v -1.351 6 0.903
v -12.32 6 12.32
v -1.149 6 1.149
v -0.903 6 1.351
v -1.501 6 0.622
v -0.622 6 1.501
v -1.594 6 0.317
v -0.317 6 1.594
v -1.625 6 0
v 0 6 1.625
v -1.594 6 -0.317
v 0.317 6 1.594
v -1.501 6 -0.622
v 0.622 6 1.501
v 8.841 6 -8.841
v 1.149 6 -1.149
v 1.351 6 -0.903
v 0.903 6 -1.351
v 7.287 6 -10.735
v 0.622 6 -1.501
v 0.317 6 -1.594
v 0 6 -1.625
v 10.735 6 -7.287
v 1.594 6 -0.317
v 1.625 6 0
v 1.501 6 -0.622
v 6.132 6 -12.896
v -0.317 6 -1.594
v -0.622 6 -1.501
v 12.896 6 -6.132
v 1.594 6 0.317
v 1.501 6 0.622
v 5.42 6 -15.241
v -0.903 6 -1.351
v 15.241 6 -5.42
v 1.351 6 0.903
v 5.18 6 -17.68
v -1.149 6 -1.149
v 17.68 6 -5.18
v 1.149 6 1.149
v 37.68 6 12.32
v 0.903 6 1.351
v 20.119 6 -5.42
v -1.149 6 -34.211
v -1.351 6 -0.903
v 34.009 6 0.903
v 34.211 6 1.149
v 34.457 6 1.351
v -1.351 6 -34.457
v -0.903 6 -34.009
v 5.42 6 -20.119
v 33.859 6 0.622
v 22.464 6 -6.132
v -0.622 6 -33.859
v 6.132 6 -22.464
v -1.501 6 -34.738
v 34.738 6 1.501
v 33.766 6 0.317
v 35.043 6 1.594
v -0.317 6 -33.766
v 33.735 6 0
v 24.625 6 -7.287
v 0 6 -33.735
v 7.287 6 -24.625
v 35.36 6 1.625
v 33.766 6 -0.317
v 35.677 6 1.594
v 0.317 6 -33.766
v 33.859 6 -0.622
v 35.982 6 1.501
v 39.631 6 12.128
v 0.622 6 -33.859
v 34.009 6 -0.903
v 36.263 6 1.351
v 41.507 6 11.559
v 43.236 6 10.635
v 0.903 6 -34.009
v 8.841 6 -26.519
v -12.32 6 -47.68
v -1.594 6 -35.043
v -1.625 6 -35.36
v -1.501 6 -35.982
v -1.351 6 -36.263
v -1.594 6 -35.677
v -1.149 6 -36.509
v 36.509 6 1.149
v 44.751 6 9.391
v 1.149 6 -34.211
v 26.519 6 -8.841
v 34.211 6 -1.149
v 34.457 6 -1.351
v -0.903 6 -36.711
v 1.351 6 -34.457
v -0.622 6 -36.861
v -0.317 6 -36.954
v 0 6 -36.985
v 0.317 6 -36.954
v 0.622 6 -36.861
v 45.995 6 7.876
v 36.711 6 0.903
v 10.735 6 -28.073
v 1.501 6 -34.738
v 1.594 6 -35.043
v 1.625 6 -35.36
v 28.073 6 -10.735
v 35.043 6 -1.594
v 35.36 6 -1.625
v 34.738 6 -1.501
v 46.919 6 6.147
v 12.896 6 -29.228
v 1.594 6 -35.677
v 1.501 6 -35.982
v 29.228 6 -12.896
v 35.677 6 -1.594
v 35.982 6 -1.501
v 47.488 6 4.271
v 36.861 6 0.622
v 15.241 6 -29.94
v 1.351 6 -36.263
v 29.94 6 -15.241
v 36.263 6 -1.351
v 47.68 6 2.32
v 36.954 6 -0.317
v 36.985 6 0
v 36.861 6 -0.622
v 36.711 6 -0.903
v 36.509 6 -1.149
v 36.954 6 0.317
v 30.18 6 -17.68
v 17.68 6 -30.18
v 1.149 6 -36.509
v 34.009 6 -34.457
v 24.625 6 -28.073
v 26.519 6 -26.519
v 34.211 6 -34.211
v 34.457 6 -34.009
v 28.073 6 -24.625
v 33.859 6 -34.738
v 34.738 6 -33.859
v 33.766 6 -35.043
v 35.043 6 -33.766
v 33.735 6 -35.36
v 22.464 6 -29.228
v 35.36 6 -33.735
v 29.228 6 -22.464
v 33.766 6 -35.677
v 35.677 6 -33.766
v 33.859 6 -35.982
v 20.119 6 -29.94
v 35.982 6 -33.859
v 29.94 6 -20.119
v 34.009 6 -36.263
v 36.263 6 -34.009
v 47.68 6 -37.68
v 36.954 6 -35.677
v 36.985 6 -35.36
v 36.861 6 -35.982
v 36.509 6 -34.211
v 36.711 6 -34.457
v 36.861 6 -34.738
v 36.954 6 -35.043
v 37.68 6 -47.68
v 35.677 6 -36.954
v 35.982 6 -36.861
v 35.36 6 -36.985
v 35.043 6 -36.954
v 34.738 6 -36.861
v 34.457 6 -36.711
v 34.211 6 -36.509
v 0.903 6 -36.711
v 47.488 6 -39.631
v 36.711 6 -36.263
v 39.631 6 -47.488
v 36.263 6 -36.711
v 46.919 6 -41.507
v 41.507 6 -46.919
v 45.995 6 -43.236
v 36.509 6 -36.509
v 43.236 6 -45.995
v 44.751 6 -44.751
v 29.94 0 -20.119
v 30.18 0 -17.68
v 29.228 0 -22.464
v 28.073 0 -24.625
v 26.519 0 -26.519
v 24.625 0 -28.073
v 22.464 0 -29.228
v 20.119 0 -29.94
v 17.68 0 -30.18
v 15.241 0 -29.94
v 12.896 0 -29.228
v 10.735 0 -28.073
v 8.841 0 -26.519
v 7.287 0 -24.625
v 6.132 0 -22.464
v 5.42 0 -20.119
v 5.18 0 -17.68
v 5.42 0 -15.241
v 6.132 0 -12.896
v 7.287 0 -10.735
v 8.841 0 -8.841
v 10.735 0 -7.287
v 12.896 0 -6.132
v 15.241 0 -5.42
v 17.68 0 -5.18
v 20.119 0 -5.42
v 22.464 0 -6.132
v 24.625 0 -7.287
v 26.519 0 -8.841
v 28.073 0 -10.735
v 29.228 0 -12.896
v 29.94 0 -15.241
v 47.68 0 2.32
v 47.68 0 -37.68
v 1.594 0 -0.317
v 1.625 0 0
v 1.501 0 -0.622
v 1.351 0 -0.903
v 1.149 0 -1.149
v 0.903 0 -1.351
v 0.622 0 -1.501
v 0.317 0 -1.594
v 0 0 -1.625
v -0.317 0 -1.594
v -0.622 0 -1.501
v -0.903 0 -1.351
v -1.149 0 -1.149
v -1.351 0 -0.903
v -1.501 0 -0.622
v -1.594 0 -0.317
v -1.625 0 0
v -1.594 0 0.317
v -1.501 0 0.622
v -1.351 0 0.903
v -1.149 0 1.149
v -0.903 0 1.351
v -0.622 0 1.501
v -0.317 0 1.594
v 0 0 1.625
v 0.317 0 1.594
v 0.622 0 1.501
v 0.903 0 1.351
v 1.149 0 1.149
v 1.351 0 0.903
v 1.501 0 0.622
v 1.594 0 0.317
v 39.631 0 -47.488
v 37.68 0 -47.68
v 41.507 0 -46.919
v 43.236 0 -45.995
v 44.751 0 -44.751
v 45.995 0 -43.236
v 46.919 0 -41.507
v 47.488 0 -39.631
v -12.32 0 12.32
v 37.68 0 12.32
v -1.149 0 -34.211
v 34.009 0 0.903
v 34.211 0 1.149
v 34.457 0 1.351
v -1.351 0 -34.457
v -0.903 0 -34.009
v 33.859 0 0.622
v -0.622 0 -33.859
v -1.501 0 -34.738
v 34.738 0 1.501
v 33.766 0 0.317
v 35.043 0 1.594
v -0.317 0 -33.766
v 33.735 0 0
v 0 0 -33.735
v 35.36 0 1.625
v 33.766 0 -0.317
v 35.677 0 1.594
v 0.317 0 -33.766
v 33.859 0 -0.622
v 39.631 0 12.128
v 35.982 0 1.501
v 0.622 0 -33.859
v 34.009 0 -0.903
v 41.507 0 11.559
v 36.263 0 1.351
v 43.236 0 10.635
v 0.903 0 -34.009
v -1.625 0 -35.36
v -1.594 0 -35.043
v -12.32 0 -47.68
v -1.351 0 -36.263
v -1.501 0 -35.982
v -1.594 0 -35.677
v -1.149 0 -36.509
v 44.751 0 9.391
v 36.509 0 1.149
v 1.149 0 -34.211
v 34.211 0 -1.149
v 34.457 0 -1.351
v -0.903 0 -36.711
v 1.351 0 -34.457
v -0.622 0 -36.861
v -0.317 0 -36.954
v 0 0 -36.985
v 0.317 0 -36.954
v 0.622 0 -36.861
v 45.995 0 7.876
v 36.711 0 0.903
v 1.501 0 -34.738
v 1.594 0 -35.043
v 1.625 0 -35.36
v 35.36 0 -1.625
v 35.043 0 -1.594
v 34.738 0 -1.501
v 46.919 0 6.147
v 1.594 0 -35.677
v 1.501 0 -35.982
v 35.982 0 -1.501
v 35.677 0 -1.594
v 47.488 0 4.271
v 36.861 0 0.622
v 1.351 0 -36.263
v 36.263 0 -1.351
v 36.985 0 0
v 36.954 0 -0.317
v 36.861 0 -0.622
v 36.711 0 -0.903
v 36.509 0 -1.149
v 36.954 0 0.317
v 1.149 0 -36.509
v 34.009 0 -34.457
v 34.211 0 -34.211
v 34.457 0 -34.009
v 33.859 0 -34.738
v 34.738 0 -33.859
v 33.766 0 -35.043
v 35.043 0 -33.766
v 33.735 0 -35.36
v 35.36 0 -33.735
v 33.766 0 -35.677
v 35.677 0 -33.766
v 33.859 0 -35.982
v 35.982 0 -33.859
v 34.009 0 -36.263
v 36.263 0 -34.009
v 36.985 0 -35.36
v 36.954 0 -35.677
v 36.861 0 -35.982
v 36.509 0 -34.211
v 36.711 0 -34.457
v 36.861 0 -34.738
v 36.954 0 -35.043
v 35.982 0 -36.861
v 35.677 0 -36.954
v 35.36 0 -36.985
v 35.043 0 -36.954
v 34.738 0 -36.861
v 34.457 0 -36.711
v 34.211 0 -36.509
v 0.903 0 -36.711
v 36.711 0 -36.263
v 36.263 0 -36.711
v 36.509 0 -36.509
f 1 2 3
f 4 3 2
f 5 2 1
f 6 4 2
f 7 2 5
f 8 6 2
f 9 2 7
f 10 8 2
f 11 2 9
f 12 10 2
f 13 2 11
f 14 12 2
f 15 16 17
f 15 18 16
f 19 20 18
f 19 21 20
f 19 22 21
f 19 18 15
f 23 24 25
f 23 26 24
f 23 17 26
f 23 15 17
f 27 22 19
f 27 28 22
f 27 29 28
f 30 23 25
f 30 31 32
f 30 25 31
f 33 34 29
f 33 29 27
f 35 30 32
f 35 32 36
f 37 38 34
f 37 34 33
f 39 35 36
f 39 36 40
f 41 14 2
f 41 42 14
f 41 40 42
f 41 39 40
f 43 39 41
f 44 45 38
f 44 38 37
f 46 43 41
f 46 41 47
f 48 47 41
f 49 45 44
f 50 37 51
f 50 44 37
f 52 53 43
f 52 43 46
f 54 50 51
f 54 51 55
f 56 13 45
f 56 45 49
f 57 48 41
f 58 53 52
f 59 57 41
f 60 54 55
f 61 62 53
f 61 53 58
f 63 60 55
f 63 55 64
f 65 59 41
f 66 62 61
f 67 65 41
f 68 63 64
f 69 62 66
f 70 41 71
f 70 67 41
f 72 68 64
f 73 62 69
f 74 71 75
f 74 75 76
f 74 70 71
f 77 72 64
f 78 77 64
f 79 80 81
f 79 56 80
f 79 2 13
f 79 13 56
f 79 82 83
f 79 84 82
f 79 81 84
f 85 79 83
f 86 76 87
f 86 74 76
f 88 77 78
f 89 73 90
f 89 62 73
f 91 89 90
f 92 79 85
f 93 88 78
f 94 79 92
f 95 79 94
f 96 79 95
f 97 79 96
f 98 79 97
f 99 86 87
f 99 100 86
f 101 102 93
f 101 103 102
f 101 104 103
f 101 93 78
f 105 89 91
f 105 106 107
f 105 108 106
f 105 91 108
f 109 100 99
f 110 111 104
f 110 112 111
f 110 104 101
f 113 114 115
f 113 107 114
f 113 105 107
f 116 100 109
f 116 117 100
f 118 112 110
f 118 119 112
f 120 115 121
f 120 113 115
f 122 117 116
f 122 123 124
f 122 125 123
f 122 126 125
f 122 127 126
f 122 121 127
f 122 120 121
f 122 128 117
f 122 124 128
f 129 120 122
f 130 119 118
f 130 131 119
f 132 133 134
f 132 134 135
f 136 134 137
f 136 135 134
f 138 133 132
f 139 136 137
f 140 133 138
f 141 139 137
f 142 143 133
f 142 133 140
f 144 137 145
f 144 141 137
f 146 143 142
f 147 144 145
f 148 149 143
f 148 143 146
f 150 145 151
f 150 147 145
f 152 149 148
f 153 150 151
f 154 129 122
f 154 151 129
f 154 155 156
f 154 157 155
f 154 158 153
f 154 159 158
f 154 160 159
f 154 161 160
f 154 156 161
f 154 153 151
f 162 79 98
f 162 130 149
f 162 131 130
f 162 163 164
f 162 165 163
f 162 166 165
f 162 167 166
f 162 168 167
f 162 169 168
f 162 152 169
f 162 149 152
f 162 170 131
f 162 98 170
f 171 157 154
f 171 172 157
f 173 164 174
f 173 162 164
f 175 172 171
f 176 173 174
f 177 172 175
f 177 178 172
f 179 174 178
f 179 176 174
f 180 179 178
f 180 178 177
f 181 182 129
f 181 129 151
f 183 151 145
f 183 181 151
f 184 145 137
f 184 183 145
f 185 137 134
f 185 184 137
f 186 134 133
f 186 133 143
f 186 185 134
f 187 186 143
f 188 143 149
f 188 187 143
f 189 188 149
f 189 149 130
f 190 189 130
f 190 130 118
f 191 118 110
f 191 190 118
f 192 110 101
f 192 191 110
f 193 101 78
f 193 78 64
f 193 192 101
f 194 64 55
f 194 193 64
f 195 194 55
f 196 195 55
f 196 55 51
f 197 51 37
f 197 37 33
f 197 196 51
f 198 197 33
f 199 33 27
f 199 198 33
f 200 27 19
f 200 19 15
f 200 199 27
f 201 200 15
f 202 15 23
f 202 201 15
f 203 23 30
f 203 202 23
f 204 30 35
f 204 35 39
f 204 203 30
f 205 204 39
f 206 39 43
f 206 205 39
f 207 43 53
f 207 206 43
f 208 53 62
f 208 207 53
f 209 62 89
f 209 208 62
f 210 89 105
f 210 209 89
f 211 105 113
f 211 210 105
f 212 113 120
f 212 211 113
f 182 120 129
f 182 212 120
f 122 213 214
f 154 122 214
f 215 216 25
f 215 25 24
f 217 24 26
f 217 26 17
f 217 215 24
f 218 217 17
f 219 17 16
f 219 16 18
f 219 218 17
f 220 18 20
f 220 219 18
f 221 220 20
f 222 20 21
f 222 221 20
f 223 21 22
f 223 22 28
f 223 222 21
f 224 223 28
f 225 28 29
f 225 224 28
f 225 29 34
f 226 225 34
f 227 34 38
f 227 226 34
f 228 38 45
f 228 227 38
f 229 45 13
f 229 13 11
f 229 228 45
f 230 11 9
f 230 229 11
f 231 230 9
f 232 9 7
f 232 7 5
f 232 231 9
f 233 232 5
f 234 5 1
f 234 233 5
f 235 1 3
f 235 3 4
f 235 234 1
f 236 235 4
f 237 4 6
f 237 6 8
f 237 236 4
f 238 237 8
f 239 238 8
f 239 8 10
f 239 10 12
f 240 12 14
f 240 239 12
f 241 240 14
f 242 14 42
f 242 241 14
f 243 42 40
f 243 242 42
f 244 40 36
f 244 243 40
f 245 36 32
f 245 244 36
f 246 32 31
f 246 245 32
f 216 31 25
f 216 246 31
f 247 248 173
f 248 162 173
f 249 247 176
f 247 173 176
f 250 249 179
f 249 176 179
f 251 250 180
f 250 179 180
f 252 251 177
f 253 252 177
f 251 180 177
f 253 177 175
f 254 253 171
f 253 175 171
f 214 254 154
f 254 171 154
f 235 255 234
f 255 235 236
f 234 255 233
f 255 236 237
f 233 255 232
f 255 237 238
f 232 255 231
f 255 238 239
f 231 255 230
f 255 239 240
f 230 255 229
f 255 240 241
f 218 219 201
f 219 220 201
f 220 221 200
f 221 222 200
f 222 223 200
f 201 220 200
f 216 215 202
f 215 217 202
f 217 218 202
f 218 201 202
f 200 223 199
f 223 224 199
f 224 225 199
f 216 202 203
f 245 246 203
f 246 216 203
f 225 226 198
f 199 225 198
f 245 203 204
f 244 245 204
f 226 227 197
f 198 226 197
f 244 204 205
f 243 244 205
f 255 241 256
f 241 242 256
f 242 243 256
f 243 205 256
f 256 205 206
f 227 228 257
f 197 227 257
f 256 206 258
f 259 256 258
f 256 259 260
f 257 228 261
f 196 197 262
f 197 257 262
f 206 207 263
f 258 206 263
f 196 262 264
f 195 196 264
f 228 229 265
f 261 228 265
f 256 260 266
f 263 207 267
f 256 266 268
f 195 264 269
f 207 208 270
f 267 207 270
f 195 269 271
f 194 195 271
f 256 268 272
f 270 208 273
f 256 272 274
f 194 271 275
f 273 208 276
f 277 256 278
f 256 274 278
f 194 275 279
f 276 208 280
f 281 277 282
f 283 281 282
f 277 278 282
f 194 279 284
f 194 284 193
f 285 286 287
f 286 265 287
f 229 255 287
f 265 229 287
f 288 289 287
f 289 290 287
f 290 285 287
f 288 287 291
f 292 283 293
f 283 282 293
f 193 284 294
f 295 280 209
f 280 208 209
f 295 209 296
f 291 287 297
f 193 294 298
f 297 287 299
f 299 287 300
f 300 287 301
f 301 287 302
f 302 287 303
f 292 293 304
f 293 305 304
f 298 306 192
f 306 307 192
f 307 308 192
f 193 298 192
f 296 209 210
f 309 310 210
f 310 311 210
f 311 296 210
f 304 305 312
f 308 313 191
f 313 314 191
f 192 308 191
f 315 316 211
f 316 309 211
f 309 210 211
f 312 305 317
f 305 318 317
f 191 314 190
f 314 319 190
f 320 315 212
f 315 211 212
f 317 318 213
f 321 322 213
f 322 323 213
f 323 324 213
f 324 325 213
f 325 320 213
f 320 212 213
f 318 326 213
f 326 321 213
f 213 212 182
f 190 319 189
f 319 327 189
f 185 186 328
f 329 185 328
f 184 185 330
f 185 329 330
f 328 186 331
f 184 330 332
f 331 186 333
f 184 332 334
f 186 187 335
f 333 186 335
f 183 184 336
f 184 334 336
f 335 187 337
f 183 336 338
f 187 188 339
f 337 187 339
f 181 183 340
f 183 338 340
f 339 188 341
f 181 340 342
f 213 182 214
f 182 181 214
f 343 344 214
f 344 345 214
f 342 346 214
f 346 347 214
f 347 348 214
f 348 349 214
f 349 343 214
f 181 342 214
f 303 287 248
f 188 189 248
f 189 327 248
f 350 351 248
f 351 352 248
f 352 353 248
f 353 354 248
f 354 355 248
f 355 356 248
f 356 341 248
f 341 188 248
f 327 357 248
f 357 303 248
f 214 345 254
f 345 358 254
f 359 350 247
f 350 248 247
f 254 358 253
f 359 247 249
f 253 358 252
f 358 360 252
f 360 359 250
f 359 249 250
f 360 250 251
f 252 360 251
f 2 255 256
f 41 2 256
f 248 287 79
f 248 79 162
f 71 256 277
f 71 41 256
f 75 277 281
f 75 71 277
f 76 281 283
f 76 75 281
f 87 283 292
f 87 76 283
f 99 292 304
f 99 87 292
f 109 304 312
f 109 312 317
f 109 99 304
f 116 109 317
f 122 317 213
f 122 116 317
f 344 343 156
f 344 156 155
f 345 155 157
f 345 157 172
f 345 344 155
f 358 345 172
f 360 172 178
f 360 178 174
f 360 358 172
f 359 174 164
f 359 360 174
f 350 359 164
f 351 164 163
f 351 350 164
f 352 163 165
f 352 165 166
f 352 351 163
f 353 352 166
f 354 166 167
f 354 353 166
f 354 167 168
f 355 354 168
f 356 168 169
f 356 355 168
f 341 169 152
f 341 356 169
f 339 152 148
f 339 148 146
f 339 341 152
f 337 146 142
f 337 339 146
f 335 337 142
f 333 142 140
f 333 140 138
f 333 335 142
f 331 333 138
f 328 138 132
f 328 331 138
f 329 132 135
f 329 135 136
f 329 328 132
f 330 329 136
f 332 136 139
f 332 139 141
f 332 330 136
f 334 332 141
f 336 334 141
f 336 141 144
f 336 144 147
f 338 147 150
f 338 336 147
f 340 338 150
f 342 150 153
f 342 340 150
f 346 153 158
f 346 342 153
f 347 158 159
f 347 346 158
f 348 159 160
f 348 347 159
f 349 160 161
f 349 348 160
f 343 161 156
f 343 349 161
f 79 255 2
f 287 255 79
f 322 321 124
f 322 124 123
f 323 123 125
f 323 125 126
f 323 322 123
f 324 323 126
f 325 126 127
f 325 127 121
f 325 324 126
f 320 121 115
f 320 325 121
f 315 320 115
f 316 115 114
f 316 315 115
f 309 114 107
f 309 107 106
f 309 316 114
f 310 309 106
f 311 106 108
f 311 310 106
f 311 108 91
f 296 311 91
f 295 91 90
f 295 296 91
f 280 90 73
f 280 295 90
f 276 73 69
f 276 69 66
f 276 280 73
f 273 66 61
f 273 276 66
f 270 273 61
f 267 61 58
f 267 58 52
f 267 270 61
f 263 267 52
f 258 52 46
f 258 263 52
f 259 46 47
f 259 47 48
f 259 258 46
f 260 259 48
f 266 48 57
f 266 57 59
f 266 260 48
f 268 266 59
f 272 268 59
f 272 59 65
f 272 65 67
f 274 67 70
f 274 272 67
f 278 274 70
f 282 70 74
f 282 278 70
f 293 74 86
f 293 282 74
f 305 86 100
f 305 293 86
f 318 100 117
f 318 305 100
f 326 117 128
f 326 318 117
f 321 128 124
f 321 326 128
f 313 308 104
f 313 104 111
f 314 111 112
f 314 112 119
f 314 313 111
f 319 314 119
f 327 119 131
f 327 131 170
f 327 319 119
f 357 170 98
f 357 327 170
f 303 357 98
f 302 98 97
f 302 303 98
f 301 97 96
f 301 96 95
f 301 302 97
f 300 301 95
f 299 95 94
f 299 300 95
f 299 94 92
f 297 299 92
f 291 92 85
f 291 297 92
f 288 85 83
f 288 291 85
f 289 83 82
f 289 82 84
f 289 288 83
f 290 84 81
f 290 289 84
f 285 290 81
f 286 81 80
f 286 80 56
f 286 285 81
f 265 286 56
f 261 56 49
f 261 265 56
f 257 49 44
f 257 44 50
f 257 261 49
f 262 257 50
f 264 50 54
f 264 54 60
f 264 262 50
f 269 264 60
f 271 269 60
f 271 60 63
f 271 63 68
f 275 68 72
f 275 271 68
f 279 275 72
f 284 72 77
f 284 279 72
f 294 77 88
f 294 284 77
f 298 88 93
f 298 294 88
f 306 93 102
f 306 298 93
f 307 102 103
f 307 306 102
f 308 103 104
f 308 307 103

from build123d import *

# Parameters (mm, degrees)
SKETCH1_W           = 60
SKETCH1_H           = 60
SKETCH1_R           = 1.625
SKETCH1_R_2         = 12.5
BOSS_EXTRUDE1_DEPTH = 6
FILLET1_R           = 10


with BuildPart() as part:
    # Sketch1 → Boss-Extrude1 (new body)
    with BuildSketch(Plane(origin=(0, 0, 0), x_dir=(1, 0, 0), z_dir=(0, 1, 0))):
        with Locations((17.68, 17.68)):
            Rectangle(SKETCH1_W, SKETCH1_H)
        with Locations((0, 35.36)):
            Circle(SKETCH1_R, mode=Mode.SUBTRACT)
        with Locations((35.36, 35.36)):
            Circle(SKETCH1_R, mode=Mode.SUBTRACT)
        with Locations((35.36, 0)):
            Circle(SKETCH1_R, mode=Mode.SUBTRACT)
        Circle(SKETCH1_R, mode=Mode.SUBTRACT)
        with Locations((17.68, 17.68)):
            Circle(SKETCH1_R_2, mode=Mode.SUBTRACT)
    extrude(amount=BOSS_EXTRUDE1_DEPTH)

    # Fillet1
    fillet1_edges = [part.edges().sort_by_distance(p)[0] for p in [
        (47.68, 3, -47.68),
        (47.68, 3, 12.32),
    ]]
    fillet(fillet1_edges, radius=FILLET1_R)


solid = part.part
